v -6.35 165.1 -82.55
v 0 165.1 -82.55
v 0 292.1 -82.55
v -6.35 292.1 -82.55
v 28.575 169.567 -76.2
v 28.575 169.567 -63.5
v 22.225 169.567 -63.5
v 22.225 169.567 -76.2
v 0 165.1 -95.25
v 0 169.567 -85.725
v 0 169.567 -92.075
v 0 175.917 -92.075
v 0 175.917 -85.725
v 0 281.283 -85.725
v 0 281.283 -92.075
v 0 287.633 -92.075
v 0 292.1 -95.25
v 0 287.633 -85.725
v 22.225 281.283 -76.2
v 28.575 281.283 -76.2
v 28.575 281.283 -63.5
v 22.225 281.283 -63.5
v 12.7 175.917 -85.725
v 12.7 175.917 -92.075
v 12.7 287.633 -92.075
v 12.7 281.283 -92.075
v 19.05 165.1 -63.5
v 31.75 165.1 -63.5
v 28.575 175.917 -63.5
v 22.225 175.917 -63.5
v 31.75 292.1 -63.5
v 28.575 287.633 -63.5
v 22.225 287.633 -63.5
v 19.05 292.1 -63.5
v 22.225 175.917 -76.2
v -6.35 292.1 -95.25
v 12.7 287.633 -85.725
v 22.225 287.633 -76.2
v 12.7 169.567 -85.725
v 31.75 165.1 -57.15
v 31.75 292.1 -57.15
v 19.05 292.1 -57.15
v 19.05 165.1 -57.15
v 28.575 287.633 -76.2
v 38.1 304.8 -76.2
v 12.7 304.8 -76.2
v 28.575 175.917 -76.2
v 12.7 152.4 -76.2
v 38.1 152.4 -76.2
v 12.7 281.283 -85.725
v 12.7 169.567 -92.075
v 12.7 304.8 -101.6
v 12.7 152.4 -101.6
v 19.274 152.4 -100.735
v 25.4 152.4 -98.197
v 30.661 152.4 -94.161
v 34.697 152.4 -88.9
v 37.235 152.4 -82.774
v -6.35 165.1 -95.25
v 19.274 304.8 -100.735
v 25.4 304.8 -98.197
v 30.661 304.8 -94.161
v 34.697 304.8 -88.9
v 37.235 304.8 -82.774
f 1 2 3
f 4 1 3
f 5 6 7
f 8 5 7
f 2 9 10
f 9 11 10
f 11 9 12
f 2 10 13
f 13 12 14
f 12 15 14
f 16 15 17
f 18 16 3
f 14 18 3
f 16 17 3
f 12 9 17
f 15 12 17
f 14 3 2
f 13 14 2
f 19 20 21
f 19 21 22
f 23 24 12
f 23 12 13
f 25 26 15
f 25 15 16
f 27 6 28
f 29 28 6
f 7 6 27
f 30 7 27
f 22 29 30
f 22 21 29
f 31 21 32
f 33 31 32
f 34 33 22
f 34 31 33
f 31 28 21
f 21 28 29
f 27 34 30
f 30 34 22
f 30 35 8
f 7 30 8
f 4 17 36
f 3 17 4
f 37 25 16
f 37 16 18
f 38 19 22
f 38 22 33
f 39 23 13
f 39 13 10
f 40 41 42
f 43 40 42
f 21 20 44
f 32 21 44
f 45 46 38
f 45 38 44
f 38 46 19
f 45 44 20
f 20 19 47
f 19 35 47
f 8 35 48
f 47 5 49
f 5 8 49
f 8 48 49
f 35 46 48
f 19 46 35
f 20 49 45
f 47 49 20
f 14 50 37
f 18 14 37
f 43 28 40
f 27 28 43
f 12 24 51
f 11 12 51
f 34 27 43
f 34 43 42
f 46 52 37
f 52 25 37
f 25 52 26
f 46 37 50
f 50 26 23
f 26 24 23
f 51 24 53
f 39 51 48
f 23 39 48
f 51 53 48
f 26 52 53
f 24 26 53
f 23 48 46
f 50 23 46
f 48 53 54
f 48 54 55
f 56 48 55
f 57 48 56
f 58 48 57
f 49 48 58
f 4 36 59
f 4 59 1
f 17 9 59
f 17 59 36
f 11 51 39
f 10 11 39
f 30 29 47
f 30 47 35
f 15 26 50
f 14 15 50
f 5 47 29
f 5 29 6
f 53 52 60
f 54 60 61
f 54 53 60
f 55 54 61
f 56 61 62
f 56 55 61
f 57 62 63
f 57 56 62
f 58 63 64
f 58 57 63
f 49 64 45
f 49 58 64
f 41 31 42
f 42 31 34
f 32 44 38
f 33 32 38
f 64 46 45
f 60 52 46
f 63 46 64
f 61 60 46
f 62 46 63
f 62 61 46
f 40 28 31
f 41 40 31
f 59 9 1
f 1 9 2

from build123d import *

# Parameters (mm, degrees)
SKETCH1_W               = 38.1
SKETCH1_H               = 101.6
BOSS_EXTRUDE1_DEPTH     = 304.8
CUT_EXTRUDE2_DEPTH      = 324.538575753
SKETCH3_W               = 12.7
SKETCH3_H               = 25.4
CUT_EXTRUDE3_DEPTH      = 324.538575753
CUT_EXTRUDE4_DEPTH      = 324.538575753
CUT_EXTRUDE5_DEPTH      = 152.4
SKETCH6_W               = 6.35
SKETCH6_H               = 6.35
BOSS_EXTRUDE2_DEPTH     = 12.7
SKETCH7_W               = 12.7
SKETCH7_H               = 127
BOSS_EXTRUDE3_DEPTH     = 6.35
MIRROR2_COPY_1_SKETCH_W = 6.35
MIRROR2_COPY_1_SKETCH_H = 6.35
MIRROR2_COPY_1_DEPTH    = 12.7


with BuildPart() as part:
    # Sketch1 → Boss-Extrude1 (new body)
    with BuildSketch(Plane(origin=(0, 0, 0), x_dir=(1, 0, 0), z_dir=(0, 1, 0))):
        with Locations((19.05, 50.8)):
            Rectangle(SKETCH1_W, SKETCH1_H)
    extrude(amount=BOSS_EXTRUDE1_DEPTH)

    # Sketch2 → Cut-Extrude2 (cut, through all)
    with BuildSketch(Plane.XZ):
        Polygon((12.7, -76.2), (38.1, -76.2), (38.1, 0), (0, 0), (0, -76.2), align=None)
    extrude(amount=-CUT_EXTRUDE2_DEPTH, mode=Mode.SUBTRACT)

    # Sketch3 → Cut-Extrude3 (cut, through all)
    with BuildSketch(Plane.XZ):
        with Locations((6.35, -88.9)):
            Rectangle(SKETCH3_W, SKETCH3_H)
    extrude(amount=-CUT_EXTRUDE3_DEPTH, mode=Mode.SUBTRACT)

    # Sketch4 → Cut-Extrude4 (cut, through all)
    with BuildSketch(Plane.XZ):
        with BuildLine():
            ThreePointArc((12.7, -101.6), (30.660512242, -94.160512242), (38.1, -76.2))
            Line((38.1, -76.2), (38.1, -101.6))
            Line((38.1, -101.6), (12.7, -101.6))
        make_face()
    extrude(amount=-CUT_EXTRUDE4_DEPTH, mode=Mode.SUBTRACT)

    # Sketch5 → Cut-Extrude5 (cut)
    with BuildSketch(Plane.XZ):
        with BuildLine():
            Line((12.7, -76.2), (12.7, -101.6))
            ThreePointArc((12.7, -101.6), (30.660512242, -94.160512242), (38.1, -76.2))
            Line((38.1, -76.2), (12.7, -76.2))
        make_face()
    extrude(amount=-CUT_EXTRUDE5_DEPTH, mode=Mode.SUBTRACT)

    # Sketch6 → Boss-Extrude2 (add)
    with BuildSketch(Plane.ZY.offset(-12.7)):
        with Locations((-88.9, 284.458069637)):
            Rectangle(SKETCH6_W, SKETCH6_H)
    boss_extrude2 = extrude(amount=BOSS_EXTRUDE2_DEPTH)

    # Mirror1: Boss-Extrude2 across plane
    add(boss_extrude2.mirror(Plane(origin=(0, 228.6, 0), x_dir=(0, 0, 1), z_dir=(0, -1, 0))))

    # Sketch7 → Boss-Extrude3 (add)
    with BuildSketch(Plane.ZY):
        with Locations((-88.9, 228.6)):
            Rectangle(SKETCH7_W, SKETCH7_H)
    boss_extrude3 = extrude(amount=BOSS_EXTRUDE3_DEPTH)

    # Mirror2: Boss-Extrude2, Boss-Extrude3 across plane
    add(boss_extrude2.mirror(Plane(origin=(-31.75, 0, -31.75), x_dir=(-0.7071067811865479, 0, 0.7071067811865471), z_dir=(0.7071067811865471, 0, 0.7071067811865479))))
    add(boss_extrude3.mirror(Plane(origin=(-31.75, 0, -31.75), x_dir=(-0.7071067811865479, 0, 0.7071067811865471), z_dir=(0.7071067811865471, 0, 0.7071067811865479))))

    # Mirror2 copy 1 sketch → Mirror2 copy 1 (add)
    with BuildSketch(Plane(origin=(-63.5, 457.2, -76.2), x_dir=(-1, 0, 0), z_dir=(0, 0, 1))):
        with Locations((-88.9, 284.458069637)):
            Rectangle(MIRROR2_COPY_1_SKETCH_W, MIRROR2_COPY_1_SKETCH_H)
    extrude(amount=MIRROR2_COPY_1_DEPTH)


solid = part.part
